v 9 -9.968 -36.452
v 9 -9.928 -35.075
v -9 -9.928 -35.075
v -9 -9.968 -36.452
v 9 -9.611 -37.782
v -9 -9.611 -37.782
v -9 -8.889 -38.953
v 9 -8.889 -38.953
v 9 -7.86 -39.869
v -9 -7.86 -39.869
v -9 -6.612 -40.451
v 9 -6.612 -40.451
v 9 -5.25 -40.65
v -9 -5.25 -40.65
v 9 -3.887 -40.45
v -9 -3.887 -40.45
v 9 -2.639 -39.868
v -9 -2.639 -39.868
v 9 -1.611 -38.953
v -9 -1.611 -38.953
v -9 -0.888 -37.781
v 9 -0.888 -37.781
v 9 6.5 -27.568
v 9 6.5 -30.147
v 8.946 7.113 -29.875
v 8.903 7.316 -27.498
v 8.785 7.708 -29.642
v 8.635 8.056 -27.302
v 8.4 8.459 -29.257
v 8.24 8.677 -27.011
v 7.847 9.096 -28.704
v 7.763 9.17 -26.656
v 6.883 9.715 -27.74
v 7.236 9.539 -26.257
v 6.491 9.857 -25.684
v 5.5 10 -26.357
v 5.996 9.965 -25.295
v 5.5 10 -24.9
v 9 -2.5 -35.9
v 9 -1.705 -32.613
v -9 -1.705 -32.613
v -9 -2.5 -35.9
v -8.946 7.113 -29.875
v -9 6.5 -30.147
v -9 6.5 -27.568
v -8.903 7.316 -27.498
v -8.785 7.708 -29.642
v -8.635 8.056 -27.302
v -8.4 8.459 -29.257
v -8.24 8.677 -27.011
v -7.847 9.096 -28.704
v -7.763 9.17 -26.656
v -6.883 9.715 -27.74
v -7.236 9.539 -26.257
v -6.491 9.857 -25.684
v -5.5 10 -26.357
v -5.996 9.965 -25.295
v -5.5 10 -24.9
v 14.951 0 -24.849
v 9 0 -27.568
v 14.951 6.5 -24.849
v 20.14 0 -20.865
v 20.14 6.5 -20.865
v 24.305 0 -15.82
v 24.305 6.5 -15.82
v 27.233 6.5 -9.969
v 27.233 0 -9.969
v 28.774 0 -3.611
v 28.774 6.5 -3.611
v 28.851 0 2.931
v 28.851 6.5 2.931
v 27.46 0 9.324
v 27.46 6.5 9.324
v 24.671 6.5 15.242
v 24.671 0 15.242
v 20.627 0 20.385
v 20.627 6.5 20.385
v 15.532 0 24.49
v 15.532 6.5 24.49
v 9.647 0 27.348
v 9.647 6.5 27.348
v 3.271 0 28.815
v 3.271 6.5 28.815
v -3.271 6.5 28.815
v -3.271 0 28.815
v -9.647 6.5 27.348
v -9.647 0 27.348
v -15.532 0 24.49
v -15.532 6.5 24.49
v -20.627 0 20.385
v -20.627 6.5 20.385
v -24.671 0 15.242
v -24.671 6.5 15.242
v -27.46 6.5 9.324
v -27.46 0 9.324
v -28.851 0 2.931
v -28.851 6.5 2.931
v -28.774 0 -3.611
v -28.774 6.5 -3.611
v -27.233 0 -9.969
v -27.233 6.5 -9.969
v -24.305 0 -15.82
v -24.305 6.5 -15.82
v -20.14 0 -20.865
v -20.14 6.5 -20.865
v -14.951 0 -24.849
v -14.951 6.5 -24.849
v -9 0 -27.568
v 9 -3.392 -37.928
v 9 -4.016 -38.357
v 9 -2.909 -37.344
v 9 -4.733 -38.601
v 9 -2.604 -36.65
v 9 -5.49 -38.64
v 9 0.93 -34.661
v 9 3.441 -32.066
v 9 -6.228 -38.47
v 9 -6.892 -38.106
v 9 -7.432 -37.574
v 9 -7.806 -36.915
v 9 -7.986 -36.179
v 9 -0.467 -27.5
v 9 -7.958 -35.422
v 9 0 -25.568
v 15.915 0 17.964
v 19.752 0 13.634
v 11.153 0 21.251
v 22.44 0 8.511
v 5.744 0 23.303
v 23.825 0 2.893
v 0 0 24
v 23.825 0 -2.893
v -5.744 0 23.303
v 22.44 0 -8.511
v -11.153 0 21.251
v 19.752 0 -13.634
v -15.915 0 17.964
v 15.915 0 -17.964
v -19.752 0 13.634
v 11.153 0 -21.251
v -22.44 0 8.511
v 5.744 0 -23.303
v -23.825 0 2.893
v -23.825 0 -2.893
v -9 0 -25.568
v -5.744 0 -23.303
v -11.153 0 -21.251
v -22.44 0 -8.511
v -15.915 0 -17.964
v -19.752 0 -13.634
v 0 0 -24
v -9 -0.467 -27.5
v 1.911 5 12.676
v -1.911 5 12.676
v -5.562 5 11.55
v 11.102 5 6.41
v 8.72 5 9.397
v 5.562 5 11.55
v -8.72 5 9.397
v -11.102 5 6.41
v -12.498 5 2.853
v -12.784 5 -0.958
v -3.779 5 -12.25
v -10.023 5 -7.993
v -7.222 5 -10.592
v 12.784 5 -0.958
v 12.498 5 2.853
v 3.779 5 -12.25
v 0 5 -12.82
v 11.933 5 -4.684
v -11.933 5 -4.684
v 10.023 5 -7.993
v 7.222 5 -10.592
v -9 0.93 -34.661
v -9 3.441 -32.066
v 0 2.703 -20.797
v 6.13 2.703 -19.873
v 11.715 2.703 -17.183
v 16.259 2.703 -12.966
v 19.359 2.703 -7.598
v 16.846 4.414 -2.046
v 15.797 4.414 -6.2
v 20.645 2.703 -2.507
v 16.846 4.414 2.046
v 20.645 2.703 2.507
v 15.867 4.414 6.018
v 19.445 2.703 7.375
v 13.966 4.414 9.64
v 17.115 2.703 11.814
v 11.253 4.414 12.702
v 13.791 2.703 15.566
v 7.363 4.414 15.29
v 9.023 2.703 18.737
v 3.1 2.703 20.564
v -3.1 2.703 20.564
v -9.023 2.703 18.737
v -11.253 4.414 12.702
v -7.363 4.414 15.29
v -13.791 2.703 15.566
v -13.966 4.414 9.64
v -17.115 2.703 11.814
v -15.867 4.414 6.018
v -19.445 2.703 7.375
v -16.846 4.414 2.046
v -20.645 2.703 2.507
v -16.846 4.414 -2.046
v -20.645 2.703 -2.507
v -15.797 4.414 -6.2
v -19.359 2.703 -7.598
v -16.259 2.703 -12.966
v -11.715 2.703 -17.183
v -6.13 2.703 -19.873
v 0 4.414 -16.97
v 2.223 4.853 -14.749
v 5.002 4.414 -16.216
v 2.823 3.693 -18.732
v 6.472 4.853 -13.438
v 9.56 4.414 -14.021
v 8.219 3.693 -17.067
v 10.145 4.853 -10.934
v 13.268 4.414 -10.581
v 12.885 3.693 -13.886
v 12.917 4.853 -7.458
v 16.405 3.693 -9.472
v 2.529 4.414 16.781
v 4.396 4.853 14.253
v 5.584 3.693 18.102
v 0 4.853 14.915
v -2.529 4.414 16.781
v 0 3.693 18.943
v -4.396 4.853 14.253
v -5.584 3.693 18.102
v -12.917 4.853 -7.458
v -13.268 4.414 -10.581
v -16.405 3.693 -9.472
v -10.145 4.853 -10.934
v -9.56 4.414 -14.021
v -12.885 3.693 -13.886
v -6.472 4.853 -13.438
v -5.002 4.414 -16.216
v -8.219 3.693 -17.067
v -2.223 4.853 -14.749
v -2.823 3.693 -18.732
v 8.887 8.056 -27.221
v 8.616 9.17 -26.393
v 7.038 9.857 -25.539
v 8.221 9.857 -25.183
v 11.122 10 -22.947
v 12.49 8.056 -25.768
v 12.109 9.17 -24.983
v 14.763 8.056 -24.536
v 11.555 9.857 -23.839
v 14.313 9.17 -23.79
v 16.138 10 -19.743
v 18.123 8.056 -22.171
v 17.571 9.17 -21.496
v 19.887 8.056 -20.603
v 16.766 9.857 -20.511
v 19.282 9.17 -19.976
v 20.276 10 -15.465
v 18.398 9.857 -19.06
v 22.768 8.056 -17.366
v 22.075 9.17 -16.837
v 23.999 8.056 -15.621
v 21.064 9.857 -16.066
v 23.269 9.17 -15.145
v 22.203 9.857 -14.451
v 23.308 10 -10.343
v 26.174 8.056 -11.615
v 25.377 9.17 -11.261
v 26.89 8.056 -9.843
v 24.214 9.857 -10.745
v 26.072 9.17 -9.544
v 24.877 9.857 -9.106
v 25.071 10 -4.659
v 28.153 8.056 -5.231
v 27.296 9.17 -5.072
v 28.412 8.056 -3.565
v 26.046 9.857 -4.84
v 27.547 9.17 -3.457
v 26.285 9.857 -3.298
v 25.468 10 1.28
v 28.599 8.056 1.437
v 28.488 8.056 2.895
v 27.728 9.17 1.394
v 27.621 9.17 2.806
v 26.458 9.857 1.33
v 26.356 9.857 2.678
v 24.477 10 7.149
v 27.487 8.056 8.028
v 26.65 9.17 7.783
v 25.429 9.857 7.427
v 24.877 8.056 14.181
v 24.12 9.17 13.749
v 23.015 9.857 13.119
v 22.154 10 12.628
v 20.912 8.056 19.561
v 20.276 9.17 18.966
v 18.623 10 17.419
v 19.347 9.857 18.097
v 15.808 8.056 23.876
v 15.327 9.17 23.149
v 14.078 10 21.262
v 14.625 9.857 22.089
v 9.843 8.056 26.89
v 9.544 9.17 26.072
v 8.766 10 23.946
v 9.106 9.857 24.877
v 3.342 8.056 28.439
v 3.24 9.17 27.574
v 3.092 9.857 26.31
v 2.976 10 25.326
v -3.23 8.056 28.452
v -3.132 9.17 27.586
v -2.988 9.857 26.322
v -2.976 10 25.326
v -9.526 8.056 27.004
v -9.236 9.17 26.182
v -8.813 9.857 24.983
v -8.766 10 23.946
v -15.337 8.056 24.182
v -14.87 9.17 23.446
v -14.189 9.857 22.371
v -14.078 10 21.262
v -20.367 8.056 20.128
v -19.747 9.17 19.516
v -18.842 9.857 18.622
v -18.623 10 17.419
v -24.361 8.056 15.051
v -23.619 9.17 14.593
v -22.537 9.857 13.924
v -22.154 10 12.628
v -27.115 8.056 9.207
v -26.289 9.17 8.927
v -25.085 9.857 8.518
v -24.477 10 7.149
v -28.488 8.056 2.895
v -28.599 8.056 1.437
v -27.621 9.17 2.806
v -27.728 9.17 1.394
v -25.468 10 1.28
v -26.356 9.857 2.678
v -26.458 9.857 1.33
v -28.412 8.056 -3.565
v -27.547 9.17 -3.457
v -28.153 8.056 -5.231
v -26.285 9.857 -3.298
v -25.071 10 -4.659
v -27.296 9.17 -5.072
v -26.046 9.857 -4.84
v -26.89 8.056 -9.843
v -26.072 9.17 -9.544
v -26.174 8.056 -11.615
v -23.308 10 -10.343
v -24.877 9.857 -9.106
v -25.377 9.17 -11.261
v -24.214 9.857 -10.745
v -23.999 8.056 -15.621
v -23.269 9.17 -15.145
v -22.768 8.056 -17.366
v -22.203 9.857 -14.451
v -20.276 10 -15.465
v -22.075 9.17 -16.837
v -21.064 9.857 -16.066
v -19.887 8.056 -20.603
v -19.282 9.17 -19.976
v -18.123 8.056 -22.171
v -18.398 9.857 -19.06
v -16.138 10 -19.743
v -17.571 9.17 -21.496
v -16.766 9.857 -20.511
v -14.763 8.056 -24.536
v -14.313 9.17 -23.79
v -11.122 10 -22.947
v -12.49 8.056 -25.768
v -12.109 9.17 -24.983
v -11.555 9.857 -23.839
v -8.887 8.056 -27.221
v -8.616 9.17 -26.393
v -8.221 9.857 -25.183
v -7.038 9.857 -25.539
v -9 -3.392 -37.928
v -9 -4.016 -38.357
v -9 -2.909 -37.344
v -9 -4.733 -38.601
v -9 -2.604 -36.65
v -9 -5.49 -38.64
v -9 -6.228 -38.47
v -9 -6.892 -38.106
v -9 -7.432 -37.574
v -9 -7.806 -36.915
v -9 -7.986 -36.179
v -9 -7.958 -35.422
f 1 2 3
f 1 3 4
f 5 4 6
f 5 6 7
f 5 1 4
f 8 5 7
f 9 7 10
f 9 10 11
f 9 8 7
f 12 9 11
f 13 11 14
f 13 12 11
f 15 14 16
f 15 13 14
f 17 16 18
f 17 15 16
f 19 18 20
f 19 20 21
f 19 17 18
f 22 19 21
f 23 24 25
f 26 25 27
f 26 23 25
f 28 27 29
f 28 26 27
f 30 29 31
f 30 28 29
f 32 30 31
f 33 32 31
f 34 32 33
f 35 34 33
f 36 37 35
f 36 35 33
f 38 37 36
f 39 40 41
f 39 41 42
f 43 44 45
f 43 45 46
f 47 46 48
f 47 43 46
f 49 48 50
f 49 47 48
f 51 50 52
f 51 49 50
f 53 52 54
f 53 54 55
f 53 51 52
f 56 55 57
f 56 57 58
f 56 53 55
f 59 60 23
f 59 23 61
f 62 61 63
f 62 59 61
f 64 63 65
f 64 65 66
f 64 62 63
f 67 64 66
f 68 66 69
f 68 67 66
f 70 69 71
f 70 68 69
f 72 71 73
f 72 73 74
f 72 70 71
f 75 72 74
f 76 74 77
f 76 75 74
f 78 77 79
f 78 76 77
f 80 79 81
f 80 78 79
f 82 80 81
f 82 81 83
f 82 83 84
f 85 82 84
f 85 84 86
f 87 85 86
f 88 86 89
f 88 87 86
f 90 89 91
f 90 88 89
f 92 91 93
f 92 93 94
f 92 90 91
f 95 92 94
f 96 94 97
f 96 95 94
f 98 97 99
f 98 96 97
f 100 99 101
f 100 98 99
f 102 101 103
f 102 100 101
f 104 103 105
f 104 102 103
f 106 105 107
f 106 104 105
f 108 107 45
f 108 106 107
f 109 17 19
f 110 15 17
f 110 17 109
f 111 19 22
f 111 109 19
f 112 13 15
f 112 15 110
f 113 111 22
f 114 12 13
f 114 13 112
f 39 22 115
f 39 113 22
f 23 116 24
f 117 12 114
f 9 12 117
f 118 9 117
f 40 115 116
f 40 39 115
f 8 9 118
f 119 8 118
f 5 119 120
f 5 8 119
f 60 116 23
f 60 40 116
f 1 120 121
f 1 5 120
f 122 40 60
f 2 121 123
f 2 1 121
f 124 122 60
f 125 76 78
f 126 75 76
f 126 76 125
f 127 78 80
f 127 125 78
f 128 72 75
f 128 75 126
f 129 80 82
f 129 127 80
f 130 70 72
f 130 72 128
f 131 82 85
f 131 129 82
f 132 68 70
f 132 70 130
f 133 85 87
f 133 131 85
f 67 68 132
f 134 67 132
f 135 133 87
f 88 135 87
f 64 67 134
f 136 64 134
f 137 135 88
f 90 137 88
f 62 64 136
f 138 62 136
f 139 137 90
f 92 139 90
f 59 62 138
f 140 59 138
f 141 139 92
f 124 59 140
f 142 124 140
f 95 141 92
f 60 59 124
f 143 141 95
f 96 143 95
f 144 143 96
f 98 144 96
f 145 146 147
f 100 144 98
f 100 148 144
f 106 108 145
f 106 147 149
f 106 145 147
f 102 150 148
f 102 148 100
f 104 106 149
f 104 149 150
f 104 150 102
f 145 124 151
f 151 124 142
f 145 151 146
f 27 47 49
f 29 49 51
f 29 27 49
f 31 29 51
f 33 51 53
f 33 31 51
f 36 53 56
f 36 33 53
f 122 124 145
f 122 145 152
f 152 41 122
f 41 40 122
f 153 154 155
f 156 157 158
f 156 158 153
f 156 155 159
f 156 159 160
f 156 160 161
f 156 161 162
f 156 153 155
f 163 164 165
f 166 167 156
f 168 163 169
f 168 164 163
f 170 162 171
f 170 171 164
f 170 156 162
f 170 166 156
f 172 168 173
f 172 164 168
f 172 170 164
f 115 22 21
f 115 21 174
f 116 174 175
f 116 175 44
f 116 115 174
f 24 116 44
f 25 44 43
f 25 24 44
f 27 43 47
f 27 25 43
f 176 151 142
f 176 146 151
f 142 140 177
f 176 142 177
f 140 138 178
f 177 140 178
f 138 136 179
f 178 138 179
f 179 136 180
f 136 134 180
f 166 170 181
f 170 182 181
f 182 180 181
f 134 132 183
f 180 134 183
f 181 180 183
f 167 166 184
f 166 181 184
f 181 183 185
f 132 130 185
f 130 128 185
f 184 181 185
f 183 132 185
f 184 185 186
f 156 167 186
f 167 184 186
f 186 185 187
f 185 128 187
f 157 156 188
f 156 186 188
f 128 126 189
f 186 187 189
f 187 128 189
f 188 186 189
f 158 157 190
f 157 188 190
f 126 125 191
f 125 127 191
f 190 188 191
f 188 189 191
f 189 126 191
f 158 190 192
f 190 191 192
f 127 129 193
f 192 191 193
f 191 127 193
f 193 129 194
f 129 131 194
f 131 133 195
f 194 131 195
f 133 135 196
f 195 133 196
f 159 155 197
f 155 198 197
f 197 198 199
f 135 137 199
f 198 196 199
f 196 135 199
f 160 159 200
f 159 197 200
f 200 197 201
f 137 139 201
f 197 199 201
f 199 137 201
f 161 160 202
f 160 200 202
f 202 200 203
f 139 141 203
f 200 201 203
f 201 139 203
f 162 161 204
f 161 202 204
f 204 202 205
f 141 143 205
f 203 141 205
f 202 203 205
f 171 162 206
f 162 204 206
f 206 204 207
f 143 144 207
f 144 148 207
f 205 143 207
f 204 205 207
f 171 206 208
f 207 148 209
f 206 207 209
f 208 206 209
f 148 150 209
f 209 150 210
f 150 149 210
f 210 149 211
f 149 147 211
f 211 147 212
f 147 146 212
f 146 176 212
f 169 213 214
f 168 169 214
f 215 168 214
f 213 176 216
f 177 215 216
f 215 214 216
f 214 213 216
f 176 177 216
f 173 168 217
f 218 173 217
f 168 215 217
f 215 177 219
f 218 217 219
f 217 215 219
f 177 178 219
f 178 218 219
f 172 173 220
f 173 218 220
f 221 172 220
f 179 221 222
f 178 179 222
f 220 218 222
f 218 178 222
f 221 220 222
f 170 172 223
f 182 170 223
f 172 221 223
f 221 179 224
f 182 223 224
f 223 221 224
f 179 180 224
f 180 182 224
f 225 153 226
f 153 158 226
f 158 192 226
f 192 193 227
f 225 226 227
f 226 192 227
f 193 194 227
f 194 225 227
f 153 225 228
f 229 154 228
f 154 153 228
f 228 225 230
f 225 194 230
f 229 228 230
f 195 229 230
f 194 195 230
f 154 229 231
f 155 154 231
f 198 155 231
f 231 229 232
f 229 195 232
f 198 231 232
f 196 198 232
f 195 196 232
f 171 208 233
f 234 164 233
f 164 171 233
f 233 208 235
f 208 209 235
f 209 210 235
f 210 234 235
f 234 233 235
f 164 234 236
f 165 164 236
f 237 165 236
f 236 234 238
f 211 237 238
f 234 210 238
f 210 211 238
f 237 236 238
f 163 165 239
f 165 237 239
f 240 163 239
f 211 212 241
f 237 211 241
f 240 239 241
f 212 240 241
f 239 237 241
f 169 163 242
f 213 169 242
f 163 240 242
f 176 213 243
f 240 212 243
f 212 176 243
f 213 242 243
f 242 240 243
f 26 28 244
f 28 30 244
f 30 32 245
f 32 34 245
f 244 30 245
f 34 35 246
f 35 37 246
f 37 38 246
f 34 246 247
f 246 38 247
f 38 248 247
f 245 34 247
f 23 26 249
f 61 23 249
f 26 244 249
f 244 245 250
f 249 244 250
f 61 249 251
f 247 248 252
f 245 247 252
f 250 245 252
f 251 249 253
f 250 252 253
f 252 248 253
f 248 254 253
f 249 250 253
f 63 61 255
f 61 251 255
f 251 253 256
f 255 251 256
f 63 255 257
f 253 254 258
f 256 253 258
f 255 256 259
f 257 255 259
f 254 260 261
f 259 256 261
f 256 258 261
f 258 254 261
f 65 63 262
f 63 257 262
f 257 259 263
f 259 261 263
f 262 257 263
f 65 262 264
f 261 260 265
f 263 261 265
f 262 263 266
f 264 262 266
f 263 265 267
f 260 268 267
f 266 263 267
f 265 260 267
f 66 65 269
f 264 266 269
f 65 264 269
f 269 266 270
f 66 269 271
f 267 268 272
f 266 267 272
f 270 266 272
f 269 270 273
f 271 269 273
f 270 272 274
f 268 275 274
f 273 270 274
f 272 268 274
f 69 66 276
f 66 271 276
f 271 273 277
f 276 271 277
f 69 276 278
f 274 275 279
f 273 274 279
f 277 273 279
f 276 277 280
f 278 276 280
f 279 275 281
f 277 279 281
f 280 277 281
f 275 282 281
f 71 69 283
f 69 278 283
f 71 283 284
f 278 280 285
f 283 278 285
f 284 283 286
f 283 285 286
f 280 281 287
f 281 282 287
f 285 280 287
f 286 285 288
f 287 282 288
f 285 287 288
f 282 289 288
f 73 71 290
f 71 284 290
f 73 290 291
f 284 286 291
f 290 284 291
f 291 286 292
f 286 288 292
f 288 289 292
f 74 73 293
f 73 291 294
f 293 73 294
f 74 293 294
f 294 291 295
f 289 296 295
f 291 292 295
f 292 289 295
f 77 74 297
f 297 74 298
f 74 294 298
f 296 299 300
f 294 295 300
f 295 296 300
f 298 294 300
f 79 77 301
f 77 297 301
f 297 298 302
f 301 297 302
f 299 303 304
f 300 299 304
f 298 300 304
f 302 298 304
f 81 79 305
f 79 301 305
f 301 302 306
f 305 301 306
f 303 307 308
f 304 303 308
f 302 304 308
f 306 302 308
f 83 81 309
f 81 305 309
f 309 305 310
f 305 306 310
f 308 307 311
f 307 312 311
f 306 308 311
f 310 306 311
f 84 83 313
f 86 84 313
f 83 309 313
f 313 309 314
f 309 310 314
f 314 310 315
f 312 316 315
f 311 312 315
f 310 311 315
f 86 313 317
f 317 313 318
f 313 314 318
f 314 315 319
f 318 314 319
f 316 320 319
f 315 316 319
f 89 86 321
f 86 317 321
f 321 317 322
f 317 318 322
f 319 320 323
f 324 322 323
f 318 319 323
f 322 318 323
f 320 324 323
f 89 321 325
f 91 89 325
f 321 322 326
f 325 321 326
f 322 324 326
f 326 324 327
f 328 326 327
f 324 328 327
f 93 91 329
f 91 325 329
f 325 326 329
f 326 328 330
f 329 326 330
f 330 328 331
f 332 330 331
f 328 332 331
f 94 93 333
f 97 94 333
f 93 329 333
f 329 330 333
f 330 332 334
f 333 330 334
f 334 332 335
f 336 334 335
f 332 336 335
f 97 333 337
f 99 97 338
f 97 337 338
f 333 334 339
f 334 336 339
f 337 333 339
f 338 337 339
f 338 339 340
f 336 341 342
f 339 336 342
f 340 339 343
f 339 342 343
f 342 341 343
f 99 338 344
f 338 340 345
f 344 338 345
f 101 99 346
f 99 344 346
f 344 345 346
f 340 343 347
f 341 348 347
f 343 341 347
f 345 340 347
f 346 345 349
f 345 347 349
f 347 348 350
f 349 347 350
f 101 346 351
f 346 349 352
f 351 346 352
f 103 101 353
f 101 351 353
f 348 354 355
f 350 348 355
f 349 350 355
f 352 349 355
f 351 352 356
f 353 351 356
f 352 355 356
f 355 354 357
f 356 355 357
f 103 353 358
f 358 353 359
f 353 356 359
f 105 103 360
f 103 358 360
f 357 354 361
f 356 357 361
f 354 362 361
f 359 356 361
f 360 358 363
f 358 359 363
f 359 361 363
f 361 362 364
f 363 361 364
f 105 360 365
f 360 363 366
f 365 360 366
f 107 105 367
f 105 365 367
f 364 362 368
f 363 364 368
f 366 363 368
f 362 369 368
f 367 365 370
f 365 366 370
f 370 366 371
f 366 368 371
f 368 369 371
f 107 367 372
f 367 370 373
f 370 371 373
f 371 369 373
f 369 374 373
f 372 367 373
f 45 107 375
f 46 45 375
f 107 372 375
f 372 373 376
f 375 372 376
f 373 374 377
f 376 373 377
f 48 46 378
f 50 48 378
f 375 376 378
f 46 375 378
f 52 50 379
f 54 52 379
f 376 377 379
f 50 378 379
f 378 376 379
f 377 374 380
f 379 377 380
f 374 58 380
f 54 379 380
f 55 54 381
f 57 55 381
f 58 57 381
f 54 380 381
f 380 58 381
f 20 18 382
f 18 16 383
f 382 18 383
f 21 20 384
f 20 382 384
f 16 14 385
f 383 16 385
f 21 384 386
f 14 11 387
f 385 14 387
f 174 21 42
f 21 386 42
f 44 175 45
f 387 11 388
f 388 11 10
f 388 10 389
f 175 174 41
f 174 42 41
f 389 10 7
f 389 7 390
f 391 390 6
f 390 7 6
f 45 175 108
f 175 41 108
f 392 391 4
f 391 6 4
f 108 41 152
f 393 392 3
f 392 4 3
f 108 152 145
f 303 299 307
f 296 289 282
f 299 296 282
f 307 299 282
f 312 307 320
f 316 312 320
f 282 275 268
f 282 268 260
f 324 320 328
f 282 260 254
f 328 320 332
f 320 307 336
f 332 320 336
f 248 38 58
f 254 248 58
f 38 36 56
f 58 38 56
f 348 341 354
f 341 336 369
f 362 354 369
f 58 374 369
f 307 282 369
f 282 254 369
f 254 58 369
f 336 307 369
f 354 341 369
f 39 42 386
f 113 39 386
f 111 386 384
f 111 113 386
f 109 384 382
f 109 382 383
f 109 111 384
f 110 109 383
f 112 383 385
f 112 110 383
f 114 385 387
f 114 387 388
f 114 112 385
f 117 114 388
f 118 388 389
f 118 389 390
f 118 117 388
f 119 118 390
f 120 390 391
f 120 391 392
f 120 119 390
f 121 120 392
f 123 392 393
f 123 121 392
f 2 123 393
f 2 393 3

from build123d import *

# Parameters (mm, degrees)
BOSS_EXTRUDE1_DEPTH = 10
BOSS_EXTRUDE2_DEPTH = 18
FILLET3_R           = 15
FILLET4_R           = 3.5
SKETCH13_R          = 24
CUT_EXTRUDE1_DEPTH  = 5
FILLET6_R           = 15


with BuildPart() as part:
    # Sketch1 → Boss-Extrude1 (new body)
    with BuildSketch(Plane(origin=(0, 0, 0), x_dir=(1, 0, 0), z_dir=(0, 1, 0))):
        with BuildLine():
            Line((-9, 27.568097504), (-9, 29))
            Line((-9, 29), (9, 29))
            Line((9, 29), (9, 27.568097504))
            ThreePointArc((9, 27.568097504), (0, -29), (-9, 27.568097504))
        make_face()
    extrude(amount=BOSS_EXTRUDE1_DEPTH)

    # Sketch2 → Boss-Extrude2 (add)
    with BuildSketch(Plane(origin=(9, 0, 0), x_dir=(0, 0, -1), z_dir=(1, 0, 0))):
        with BuildLine():
            ThreePointArc((35.9, -2.5), (38.63953542, -5.489678293), (35.422467511, -7.958221321))
            Line((35.422467511, -7.958221321), (35.075171156, -9.927836827))
            ThreePointArc((35.075171156, -9.927836827), (40.631924816, -5.663989778), (35.9, -0.5))
            Line((35.9, -0.5), (29, -0.5))
            Line((29, -0.5), (29, 0))
            Line((29, 0), (27.568097504, 0))
            Line((27.568097504, 0), (25.568097504, 0))
            Line((25.568097504, 0), (35.9, -2.5))
        make_face()
    extrude(amount=-BOSS_EXTRUDE2_DEPTH)

    # Fillet3
    # the kernel refuses this fillet: 15 mm, written as the material it adds along each edge
    with BuildSketch(Plane(origin=(9, -0.5, -29), x_dir=(0, -0.04416525302112601, -0.9990242391581797), z_dir=(-1, 0, 0))) as fillet3_piece_1_section:
        with BuildLine():
            CenterArc((14.114193119, -14.023025969), FILLET3_R, 110.793105877, 55.582764188)
            Line((-0.463735157, -10.489754511), (-1.921527984, -10.136427365))
            ThreePointArc((-1.921527984, -10.136427365), (-1.730403937, -5.178629376), (-1.498536359, 0.06624788))
            Line((-1.498536359, 0.06624788), (0.06624788, 1.498536359))
            ThreePointArc((0.06624788, 1.498536359), (6.95951513, 1.193796113), (8.256784252, 1.402302597))
            Line((8.256784252, 1.402302597), (8.789275967, 0))
        make_face()
    fillet3_piece_1 = extrude(amount=18, mode=Mode.PRIVATE)
    fillet3_piece_1 = split(fillet3_piece_1, bisect_by=Plane(origin=(0, -2.614058352, -36.371375907), z_dir=(0, 0.9719513305344294, -0.23518208067867855)), keep=Keep.TOP, mode=Mode.PRIVATE)
    add(fillet3_piece_1)

    # Fillet4
    fillet4_edges = [part.edges().sort_by_distance(p)[0] for p in [
        (0, 10, -29),
        (-9, 10, -28.284048752),
        (0, 10, 29),
        (9, 10, -28.284048752),
    ]]
    fillet(fillet4_edges, radius=FILLET4_R)

    # Sketch13 → Cut-Extrude1 (cut)
    with BuildSketch(Plane.XZ):
        with Locations(Location((0, 0, 0), (0, 0, 270))):
            Circle(SKETCH13_R)
    extrude(amount=-CUT_EXTRUDE1_DEPTH, mode=Mode.SUBTRACT)

    # Fillet6
    # the kernel refuses this fillet: 15 mm, written as the material it adds along each edge
    with BuildSketch(Plane(origin=(0, 5, 0), x_dir=(0, 0, -1), z_dir=(-1, 0, 0))) as fillet6_piece_1:
        with BuildLine():
            CenterArc((12.819660113, 15), FILLET6_R, 270, 48.189685104)
            Line((12.819660113, 0), (12.819660113, -0.3))
            Line((12.819660113, -0.3), (24, -0.3))
            Line((24, -0.3), (24.3, 0))
            ThreePointArc((24.3, 0), (24.3, 2.5), (24.223606798, 4.8))
            Line((24.223606798, 4.8), (24, 5))
        make_face()
    revolve(axis=Axis((0, 5, 0), (0, -1, 0)))


solid = part.part
